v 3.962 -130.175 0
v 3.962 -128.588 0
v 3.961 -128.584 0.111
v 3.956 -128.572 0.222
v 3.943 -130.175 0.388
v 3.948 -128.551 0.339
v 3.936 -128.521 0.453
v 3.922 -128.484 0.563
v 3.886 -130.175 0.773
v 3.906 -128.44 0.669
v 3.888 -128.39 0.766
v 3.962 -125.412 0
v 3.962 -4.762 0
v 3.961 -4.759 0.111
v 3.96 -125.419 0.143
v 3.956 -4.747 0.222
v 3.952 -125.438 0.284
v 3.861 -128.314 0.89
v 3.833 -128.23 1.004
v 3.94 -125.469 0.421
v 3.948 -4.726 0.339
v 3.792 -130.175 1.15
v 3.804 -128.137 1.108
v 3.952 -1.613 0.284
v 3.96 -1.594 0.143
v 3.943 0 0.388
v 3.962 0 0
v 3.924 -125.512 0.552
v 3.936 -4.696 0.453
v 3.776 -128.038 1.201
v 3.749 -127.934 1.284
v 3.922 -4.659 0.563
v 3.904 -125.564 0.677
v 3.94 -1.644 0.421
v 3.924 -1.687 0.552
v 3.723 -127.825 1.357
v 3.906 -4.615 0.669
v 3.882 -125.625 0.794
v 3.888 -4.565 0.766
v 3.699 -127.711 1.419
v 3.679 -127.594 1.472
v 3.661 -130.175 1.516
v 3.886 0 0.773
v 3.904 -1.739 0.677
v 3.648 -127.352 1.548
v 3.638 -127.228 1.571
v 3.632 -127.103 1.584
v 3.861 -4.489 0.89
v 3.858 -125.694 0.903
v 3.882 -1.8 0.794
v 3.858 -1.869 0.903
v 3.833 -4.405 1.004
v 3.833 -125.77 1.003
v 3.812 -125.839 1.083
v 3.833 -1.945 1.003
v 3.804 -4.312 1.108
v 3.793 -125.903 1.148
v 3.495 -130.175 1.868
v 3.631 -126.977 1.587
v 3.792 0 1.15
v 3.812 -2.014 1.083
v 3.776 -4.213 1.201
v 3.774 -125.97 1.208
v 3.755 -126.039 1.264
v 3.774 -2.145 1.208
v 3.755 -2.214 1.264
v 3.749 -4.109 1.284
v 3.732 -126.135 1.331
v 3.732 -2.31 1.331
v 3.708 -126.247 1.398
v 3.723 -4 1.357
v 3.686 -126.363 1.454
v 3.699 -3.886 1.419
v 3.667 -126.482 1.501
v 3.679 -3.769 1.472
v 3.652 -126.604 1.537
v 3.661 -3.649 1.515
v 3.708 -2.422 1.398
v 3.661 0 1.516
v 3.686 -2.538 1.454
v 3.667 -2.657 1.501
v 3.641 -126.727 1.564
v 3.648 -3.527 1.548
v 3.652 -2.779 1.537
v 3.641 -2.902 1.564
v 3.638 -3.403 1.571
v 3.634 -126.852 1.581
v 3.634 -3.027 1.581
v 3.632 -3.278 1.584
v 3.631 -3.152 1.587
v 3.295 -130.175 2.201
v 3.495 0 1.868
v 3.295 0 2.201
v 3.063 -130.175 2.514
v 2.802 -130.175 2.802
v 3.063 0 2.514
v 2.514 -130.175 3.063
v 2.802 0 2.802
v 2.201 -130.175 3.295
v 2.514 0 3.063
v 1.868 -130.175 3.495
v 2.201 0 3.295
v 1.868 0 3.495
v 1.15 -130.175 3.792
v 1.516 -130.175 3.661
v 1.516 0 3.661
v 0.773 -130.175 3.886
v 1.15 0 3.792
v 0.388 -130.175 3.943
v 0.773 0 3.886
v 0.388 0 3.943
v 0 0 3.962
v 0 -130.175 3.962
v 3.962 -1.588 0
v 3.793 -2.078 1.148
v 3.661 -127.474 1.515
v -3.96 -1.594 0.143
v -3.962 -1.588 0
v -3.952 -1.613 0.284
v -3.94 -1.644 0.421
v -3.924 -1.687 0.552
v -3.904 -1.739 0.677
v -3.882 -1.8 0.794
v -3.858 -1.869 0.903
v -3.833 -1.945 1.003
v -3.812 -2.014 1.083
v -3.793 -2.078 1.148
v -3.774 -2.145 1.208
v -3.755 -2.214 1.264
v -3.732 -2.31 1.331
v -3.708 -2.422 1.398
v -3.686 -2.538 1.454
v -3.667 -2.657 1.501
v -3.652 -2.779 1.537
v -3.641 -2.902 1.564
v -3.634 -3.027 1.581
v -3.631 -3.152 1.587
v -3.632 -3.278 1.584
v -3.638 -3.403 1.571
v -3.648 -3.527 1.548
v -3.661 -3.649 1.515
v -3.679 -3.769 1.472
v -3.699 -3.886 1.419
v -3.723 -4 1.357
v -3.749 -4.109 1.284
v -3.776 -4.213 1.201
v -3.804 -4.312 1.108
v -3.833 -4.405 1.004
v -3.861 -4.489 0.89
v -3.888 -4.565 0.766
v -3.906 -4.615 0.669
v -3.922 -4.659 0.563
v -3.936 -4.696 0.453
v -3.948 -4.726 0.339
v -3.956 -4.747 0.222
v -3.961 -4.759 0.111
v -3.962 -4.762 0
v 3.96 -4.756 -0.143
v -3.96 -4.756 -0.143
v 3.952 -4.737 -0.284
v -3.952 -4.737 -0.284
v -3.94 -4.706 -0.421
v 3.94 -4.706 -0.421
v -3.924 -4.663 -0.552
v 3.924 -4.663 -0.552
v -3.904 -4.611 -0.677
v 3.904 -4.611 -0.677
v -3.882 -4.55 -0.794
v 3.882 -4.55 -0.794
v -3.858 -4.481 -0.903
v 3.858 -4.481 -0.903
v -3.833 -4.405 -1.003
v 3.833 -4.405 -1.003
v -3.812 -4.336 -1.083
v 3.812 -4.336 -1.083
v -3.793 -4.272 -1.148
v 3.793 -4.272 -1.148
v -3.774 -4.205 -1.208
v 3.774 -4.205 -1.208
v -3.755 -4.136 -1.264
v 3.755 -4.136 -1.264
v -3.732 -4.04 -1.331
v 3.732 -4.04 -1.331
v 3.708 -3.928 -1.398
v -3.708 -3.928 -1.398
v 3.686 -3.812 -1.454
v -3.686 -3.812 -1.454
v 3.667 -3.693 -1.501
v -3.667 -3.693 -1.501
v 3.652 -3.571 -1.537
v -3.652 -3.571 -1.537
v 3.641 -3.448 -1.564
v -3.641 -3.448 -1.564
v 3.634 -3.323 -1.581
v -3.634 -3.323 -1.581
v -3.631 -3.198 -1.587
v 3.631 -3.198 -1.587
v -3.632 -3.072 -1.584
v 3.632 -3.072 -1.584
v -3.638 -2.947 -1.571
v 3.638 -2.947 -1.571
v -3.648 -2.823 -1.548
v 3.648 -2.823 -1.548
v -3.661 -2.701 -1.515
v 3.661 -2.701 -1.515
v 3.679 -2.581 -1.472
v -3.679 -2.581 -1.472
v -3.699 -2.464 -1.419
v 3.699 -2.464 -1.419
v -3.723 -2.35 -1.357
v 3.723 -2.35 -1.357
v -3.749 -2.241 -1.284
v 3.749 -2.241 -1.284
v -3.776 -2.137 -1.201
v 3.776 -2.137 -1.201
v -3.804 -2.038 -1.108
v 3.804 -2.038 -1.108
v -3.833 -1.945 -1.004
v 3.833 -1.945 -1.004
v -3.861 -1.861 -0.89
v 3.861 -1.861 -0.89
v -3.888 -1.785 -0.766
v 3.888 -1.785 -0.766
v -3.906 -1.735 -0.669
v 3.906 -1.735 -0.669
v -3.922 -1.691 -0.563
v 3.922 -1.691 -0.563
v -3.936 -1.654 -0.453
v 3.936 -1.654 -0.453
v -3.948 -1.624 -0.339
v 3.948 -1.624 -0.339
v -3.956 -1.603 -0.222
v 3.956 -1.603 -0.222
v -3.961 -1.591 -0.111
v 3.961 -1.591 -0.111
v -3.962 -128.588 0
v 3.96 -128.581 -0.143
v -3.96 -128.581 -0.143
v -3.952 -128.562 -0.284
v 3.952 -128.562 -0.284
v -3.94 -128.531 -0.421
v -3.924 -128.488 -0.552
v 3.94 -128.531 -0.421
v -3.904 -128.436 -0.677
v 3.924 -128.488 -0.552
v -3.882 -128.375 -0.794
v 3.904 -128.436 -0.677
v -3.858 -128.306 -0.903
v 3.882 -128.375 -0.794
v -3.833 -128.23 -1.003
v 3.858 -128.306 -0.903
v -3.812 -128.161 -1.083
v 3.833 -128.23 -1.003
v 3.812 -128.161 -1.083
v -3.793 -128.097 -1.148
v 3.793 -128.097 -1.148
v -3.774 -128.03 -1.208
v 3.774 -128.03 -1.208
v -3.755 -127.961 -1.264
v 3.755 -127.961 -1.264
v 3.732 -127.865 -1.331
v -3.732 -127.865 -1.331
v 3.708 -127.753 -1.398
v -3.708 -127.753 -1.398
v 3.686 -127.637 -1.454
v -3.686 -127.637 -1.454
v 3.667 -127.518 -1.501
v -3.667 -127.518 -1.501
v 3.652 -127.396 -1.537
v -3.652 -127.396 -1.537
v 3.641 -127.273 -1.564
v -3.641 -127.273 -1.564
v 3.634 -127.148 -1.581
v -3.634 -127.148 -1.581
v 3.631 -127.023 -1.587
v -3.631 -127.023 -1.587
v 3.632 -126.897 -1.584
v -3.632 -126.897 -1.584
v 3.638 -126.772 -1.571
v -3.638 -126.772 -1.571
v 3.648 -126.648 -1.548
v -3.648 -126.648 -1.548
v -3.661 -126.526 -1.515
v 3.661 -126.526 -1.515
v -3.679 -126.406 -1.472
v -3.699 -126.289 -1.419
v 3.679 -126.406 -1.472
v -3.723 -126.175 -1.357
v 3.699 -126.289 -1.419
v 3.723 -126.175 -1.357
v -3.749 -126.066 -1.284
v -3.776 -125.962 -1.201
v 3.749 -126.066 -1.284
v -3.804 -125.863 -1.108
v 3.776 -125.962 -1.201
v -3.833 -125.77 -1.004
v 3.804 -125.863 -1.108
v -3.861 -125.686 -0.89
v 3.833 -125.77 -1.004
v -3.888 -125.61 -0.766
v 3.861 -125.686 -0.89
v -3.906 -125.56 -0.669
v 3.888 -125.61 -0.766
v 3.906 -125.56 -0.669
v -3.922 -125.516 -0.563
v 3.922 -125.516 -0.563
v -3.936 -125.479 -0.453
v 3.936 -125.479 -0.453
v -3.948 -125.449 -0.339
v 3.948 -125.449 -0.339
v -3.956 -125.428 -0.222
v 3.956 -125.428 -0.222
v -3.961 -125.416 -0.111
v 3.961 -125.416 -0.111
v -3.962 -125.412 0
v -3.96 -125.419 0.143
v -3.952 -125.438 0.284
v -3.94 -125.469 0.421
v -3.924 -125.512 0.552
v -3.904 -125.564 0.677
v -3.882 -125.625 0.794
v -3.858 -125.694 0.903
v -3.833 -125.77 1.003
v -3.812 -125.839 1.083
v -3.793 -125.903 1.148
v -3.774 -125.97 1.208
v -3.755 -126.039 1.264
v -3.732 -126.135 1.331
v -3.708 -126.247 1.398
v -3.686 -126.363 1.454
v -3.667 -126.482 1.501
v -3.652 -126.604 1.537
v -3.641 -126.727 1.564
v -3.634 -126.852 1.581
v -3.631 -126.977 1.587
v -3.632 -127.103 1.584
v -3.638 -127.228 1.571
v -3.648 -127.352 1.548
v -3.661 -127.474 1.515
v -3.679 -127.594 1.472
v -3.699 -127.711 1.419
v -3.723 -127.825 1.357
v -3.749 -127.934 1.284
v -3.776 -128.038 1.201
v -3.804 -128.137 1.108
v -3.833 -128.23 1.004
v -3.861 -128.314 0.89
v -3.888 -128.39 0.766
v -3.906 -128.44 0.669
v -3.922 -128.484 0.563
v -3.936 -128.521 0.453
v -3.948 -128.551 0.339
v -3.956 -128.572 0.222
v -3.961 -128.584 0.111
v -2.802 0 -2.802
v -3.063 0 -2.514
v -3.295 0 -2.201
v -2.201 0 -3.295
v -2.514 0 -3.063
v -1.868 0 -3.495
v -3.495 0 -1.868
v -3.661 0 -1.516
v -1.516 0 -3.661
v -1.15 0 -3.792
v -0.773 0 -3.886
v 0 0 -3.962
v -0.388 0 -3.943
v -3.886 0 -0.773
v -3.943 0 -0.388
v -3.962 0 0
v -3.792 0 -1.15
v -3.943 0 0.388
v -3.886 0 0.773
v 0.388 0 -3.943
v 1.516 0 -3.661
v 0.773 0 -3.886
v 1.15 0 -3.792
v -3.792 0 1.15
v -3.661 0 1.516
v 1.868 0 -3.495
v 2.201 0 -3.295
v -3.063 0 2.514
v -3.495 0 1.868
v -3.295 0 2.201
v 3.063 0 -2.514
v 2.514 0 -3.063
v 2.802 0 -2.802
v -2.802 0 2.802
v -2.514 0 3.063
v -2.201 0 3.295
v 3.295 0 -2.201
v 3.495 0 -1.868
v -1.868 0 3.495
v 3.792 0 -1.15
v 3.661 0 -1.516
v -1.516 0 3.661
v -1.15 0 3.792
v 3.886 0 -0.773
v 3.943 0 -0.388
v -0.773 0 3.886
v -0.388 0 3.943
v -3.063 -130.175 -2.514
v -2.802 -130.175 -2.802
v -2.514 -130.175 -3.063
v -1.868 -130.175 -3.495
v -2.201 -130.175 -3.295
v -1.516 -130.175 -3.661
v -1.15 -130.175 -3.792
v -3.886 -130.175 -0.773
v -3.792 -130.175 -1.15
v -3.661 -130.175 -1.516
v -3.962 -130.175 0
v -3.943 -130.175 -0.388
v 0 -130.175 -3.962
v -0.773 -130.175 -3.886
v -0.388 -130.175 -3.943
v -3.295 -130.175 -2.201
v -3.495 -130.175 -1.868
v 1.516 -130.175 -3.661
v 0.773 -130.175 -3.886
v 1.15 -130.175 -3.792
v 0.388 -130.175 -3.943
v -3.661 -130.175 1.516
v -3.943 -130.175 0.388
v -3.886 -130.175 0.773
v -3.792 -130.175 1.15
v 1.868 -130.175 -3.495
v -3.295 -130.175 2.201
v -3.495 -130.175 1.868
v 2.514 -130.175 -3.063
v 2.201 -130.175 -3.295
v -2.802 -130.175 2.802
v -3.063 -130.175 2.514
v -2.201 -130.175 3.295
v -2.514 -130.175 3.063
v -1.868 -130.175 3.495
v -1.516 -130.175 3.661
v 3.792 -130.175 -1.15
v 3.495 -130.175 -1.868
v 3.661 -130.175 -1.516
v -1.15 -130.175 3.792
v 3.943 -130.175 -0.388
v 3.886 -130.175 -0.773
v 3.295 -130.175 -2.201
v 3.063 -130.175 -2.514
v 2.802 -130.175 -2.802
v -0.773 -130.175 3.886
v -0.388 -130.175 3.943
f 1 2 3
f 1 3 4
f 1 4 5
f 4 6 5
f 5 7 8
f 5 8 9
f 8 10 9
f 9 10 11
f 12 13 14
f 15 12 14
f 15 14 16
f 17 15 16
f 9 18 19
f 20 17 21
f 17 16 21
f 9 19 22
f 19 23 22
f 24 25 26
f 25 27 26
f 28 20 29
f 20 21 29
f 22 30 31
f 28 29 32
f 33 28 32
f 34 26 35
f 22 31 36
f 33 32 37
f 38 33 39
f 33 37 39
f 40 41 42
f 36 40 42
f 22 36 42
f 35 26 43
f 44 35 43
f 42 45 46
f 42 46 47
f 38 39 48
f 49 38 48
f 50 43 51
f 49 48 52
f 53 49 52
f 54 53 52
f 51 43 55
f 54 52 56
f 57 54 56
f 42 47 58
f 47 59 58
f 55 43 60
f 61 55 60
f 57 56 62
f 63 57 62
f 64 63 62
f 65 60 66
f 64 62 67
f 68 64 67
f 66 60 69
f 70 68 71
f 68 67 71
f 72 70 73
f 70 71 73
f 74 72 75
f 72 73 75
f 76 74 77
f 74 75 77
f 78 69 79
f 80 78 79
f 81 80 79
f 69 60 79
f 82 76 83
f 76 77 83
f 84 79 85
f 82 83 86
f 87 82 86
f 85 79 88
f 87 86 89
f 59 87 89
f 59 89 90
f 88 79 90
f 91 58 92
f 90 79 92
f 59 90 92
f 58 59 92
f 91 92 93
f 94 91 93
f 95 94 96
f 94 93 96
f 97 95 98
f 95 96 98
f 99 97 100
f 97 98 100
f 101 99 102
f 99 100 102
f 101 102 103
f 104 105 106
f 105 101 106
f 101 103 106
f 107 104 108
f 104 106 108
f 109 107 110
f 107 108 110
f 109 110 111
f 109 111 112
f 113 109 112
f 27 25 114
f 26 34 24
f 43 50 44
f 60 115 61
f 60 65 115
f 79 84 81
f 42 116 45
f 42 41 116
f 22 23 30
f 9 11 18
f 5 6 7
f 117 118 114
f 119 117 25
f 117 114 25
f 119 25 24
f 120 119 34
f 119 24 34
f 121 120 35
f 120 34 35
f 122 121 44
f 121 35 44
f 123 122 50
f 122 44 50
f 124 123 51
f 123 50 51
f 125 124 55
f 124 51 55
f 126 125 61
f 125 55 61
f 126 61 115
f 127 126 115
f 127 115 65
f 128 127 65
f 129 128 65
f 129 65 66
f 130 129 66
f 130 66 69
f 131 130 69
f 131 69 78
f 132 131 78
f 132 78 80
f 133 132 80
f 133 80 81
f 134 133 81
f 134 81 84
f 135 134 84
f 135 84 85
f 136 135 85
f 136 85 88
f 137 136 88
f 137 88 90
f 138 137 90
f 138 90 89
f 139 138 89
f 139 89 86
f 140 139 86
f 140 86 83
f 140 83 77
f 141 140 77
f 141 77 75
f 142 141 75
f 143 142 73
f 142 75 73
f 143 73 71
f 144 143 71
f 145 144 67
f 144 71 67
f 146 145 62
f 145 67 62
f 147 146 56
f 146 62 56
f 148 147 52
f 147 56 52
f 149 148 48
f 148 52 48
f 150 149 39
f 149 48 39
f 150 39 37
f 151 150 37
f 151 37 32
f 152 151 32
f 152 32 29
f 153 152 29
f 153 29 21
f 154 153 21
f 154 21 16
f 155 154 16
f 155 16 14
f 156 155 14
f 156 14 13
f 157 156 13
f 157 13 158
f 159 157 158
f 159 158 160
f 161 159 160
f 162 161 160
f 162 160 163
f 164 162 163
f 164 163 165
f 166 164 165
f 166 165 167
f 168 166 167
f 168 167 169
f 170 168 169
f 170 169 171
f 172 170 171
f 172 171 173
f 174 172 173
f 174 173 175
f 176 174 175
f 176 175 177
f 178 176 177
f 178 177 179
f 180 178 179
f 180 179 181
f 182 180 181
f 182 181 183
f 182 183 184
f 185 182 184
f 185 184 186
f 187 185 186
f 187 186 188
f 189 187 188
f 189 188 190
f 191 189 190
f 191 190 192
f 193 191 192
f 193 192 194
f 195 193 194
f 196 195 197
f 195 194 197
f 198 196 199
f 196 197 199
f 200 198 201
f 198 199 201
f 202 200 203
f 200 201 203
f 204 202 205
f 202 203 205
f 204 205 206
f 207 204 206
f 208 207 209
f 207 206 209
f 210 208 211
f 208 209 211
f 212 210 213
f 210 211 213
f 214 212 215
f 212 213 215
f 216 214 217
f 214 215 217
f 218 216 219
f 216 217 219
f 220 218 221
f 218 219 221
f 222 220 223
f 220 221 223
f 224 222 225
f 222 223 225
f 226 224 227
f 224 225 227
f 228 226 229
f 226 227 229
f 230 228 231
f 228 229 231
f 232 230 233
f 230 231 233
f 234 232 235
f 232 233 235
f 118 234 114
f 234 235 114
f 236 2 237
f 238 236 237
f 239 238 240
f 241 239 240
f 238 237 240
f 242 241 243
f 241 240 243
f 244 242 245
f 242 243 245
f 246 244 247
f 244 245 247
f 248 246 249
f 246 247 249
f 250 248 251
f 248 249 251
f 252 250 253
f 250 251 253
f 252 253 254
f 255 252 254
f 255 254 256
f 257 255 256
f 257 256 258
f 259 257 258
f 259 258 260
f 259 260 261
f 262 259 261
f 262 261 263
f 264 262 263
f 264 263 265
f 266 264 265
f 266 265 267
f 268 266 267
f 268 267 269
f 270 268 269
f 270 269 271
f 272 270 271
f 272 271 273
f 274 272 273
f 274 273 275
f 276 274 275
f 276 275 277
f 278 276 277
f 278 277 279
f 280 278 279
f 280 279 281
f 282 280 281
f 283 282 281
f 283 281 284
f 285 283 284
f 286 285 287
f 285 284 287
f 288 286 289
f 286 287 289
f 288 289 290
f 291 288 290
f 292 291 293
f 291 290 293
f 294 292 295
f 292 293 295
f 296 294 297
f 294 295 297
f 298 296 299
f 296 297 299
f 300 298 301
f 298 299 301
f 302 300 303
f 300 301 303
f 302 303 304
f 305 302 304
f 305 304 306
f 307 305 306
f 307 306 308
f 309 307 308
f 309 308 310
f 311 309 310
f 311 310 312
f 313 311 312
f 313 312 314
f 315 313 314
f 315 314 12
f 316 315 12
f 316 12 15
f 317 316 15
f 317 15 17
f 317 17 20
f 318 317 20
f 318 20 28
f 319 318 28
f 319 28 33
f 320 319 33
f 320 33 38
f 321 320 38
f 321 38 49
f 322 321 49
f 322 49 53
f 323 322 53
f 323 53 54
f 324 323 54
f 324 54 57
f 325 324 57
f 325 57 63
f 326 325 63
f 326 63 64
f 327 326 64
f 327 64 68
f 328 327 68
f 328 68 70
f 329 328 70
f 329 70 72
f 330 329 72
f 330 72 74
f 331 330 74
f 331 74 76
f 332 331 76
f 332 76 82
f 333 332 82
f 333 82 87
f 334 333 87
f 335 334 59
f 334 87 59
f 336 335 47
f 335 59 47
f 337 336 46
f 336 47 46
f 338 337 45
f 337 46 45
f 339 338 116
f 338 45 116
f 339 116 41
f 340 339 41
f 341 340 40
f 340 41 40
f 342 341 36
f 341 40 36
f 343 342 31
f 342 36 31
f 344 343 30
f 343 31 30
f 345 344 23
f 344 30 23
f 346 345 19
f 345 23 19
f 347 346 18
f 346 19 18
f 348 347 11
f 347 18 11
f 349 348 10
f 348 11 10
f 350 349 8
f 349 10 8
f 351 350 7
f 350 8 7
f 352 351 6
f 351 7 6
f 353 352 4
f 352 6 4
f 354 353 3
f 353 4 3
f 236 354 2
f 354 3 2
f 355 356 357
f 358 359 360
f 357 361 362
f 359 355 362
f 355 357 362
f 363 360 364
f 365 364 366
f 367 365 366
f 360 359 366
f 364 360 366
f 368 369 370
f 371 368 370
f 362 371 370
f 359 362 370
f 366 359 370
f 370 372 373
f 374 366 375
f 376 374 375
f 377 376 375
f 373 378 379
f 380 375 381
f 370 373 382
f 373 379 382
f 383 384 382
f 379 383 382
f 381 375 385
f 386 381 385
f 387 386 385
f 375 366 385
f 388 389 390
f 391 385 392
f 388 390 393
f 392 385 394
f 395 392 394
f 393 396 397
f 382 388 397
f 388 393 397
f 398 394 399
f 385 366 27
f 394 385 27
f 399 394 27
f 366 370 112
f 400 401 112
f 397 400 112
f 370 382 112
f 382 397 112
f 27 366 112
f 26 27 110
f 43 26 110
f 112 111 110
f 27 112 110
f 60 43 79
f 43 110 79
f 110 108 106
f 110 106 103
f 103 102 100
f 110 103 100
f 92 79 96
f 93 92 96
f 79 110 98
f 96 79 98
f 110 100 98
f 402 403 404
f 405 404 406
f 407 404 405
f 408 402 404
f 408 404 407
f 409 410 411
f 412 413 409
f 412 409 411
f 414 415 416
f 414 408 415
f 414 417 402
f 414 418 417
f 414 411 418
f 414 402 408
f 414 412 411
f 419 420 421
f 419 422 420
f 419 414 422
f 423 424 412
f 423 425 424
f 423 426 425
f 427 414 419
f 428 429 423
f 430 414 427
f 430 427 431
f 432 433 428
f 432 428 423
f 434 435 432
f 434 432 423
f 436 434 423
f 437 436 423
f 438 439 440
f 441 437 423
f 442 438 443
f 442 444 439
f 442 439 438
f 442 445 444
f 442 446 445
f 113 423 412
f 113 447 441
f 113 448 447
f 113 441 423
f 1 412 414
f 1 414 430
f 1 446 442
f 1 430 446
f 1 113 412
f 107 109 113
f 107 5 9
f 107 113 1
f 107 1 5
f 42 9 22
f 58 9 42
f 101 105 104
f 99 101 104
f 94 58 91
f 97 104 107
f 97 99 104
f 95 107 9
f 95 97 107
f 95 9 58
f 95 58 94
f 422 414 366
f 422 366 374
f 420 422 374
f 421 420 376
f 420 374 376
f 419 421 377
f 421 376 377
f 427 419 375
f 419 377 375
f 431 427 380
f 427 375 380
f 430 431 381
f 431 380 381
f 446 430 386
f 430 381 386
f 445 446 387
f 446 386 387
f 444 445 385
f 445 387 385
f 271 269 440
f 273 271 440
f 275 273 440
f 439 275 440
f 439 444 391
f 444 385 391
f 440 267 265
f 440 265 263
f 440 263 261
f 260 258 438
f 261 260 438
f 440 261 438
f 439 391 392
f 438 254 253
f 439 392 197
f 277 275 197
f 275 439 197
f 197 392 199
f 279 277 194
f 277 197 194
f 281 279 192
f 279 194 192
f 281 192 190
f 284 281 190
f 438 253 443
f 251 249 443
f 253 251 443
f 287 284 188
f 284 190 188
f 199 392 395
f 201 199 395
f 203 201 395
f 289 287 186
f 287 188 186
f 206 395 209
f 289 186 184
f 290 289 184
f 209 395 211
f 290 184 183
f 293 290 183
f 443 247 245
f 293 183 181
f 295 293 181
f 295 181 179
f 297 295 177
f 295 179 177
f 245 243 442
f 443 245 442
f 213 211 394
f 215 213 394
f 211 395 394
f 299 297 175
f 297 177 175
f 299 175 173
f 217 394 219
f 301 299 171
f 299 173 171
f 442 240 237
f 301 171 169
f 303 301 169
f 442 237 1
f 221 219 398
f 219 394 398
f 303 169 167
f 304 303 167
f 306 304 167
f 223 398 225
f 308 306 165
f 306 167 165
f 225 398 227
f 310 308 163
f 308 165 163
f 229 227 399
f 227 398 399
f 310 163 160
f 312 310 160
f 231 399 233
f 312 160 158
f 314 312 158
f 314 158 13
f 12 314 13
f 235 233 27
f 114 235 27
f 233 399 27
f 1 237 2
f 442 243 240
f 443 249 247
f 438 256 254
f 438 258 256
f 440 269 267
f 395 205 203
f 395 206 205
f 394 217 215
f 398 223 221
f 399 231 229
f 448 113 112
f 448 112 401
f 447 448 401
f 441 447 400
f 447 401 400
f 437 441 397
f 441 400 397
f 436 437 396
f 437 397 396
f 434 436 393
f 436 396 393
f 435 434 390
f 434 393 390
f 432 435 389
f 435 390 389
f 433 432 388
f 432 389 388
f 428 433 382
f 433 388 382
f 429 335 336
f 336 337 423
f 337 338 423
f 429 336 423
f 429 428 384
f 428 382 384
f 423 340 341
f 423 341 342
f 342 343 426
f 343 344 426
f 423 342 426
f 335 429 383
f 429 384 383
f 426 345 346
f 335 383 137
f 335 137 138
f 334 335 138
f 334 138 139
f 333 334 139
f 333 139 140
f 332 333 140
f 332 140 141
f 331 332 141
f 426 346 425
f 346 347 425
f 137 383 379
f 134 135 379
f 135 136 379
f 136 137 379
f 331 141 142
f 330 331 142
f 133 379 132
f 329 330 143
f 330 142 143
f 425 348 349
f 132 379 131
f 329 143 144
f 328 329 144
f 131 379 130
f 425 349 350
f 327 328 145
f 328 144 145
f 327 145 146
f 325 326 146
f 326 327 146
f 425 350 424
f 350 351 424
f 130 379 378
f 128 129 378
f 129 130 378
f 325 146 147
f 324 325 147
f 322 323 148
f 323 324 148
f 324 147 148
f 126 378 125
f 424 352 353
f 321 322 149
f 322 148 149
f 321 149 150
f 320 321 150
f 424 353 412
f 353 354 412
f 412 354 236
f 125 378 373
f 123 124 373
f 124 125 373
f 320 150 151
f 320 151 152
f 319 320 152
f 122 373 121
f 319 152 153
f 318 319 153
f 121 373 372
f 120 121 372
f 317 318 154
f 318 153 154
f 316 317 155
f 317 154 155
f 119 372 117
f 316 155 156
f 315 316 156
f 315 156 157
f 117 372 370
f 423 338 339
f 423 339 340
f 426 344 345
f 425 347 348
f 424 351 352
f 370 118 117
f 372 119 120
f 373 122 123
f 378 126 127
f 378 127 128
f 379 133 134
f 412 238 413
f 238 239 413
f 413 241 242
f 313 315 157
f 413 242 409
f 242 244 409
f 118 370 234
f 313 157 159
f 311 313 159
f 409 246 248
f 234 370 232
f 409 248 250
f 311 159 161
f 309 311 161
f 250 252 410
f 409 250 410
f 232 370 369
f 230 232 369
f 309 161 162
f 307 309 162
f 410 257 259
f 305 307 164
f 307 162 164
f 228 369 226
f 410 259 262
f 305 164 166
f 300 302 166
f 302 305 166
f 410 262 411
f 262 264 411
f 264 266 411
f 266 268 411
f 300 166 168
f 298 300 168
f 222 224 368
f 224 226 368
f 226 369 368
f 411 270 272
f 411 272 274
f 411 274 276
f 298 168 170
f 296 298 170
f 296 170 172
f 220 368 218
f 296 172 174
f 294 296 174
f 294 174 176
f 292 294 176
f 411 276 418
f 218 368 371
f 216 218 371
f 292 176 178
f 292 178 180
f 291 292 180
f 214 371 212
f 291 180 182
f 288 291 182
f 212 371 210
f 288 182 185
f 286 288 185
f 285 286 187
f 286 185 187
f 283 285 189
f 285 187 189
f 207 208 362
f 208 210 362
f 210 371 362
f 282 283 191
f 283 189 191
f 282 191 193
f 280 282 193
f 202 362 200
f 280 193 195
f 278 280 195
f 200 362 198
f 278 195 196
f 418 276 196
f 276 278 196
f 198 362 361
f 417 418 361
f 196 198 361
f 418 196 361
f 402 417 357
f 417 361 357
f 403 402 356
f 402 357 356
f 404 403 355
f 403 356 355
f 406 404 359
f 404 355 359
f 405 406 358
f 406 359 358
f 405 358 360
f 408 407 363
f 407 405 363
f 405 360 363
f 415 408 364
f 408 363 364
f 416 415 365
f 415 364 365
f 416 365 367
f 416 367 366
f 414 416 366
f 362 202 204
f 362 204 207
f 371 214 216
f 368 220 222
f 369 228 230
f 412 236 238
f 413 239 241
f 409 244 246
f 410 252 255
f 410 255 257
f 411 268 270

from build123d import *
from build123d import SkipClean  # not in build123d's __all__

# Parameters (mm, degrees)
F0_W     = 7.9248
F0_H     = 7.9248
F1_DEPTH = 130.175
F2_R     = 1.5875
F3_DEPTH = 25.4
F5_DEPTH = 508


with BuildPart() as f1:
    # F0 (on Front) → F1 (new body)
    with BuildSketch(Plane.XZ):
        Rectangle(F0_W, F0_H)
    extrude(amount=F1_DEPTH)

    # F2 (on face) → F3 (cut)
    with BuildSketch(Plane.YZ.offset(3.9624)):
        with BuildLine():
            ThreePointArc((-125.4125, 0), (-127, 1.5875), (-128.5875, 0))
            ThreePointArc((-128.5875, 0), (-127, -1.5875), (-125.4125, 0))
        make_face()
        with Locations((-3.175, 0)):
            Circle(F2_R)
    extrude(amount=-F3_DEPTH, mode=Mode.SUBTRACT)

    # F4 (on face) → F5 (cut)
    with BuildSketch(Plane(origin=(0, 0, 0), x_dir=(-1, 0, 0), z_dir=(0, 1, 0))):
        with BuildLine():
            ThreePointArc((-3.9624, 0), (-2.8018399098, 2.8018399098), (0, 3.9624))
            Line((0, 3.9624), (-3.9624, 3.9624))
            Line((-3.9624, 3.9624), (-3.9624, 0))
        make_face()
        with BuildLine():
            ThreePointArc((0, 3.9624), (2.8018399098, 2.8018399098), (3.9624, 0))
            Line((3.9624, 0), (3.9624, 3.9624))
            Line((3.9624, 3.9624), (0, 3.9624))
        make_face()
        with BuildLine():
            Line((3.9624, -3.9624), (3.9624, 0))
            ThreePointArc((3.9624, 0), (2.8018399098, -2.8018399098), (0, -3.9624))
            Line((0, -3.9624), (3.9624, -3.9624))
        make_face()
        with BuildLine():
            Line((-3.9624, -3.9624), (0, -3.9624))
            ThreePointArc((0, -3.9624), (-2.8018399098, -2.8018399098), (-3.9624, 0))
            Line((-3.9624, 0), (-3.9624, -3.9624))
        make_face()
    with SkipClean():  # cleaning this boolean's faces spoils the solid; the shape is the same uncleaned
        extrude(amount=-F5_DEPTH, mode=Mode.SUBTRACT)


solid = f1.part
